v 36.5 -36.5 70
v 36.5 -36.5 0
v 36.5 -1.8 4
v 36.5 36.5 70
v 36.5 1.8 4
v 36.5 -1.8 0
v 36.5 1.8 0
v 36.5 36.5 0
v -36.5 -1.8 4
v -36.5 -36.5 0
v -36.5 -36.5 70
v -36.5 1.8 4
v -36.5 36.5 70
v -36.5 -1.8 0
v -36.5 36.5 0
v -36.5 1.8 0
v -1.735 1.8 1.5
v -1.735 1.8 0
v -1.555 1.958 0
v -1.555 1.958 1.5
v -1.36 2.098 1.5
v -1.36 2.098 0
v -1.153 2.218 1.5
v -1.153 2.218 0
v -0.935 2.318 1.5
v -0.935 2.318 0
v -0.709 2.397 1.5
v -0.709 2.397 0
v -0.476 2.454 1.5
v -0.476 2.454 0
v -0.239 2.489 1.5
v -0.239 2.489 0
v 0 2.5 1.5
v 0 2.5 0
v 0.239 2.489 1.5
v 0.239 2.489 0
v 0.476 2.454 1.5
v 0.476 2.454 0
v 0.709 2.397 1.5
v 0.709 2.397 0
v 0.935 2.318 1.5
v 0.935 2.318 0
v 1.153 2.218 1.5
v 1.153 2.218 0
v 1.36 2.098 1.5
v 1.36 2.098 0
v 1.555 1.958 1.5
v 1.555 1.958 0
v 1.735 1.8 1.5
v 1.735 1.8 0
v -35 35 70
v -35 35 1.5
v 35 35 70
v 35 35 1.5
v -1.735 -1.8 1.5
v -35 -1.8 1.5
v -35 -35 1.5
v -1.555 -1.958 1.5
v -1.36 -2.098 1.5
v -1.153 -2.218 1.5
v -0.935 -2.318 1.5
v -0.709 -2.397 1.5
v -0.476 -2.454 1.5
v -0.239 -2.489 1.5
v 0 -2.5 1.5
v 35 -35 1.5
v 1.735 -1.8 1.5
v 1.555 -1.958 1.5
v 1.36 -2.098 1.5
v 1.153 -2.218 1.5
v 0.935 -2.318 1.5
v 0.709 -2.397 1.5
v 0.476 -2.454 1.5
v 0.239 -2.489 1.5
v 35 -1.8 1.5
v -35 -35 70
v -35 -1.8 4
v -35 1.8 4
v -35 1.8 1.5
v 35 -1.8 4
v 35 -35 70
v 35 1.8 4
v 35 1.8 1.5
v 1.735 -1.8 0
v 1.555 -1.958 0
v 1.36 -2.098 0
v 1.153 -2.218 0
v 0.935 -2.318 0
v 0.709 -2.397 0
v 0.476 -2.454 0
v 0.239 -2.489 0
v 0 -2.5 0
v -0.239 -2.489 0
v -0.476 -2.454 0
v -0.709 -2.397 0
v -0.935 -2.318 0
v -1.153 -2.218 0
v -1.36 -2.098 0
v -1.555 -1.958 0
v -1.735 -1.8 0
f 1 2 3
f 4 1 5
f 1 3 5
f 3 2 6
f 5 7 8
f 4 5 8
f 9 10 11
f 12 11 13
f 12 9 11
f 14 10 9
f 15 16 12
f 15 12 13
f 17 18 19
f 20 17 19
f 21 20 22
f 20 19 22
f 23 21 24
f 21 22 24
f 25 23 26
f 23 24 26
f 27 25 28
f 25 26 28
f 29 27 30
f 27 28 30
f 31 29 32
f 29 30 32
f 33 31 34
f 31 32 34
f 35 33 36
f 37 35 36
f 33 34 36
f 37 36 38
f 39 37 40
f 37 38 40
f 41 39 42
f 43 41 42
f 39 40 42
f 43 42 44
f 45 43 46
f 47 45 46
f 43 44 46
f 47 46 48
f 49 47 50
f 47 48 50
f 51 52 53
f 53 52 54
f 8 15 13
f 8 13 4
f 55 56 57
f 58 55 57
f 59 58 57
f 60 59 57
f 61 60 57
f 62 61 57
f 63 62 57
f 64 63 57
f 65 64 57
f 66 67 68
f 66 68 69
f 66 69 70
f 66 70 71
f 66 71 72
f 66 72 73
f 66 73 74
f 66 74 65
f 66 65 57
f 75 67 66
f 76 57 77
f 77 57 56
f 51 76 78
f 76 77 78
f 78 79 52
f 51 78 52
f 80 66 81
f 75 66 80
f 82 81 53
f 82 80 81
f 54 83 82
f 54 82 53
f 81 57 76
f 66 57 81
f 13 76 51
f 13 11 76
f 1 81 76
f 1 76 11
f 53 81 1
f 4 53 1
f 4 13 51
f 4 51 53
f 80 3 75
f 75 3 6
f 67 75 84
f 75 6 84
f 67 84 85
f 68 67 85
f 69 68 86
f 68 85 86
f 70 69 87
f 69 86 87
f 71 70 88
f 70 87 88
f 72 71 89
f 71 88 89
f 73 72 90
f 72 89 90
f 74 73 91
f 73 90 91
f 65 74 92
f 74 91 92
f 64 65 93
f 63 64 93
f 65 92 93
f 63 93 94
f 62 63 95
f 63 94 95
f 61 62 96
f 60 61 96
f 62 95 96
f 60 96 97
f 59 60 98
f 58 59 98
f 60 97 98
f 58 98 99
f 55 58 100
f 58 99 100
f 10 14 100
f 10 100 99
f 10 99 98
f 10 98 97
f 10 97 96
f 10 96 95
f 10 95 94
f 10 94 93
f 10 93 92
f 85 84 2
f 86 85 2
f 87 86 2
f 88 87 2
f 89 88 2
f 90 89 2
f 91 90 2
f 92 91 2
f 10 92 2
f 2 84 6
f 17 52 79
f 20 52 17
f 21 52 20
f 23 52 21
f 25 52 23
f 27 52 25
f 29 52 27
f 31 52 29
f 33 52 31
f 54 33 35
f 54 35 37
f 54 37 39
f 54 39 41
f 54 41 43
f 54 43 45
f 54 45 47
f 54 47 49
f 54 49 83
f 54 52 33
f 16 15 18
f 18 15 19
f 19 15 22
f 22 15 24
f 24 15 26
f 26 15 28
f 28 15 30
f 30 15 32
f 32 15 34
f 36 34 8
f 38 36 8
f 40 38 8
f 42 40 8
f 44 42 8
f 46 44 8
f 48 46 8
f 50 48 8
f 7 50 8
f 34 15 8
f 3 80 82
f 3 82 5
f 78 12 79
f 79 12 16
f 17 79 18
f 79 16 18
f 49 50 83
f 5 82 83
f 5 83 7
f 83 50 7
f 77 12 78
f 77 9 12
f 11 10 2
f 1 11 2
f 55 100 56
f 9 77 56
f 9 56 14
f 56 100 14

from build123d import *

# Parameters (mm, degrees)
F0_W     = 73
F0_H     = 73
F1_DEPTH = 70
F2_T     = -1.5
F4_DEPTH = 4


with BuildPart() as f1:
    # F0 (on Top) → F1 (new body)
    with BuildSketch(Plane.XY):
        Rectangle(F0_W, F0_H)
    extrude(amount=F1_DEPTH)

    # F2
    f2_openings = [f1.faces().sort_by_distance(p)[0] for p in [
        (0, 0, 70),
    ]]
    offset(amount=F2_T, openings=f2_openings)

    # F3 (on face) → F4 (cut)
    with BuildSketch(Plane(origin=(0, 0, 0), x_dir=(1, 0, 0), z_dir=(0, 0, -1))):
        with BuildLine():
            Line((1.7349351573, -1.8), (36.5, -1.8))
            Line((36.5, -1.8), (36.5, 1.8))
            Line((36.5, 1.8), (1.7349351573, 1.8))
            ThreePointArc((1.7349351573, 1.8), (2.3007974588, 0.9779218033), (2.5, 0))
            ThreePointArc((2.5, 0), (2.3007974588, -0.9779218033), (1.7349351573, -1.8))
        make_face()
        with BuildLine():
            ThreePointArc((-1.7349351573, -1.8), (0, -2.5), (1.7349351573, -1.8))
            Line((1.7349351573, -1.8), (-1.7349351573, -1.8))
        make_face()
        with BuildLine():
            Line((-1.7349351573, -1.8), (1.7349351573, -1.8))
            ThreePointArc((1.7349351573, -1.8), (2.3007974588, -0.9779218033), (2.5, 0))
            ThreePointArc((2.5, 0), (2.3007974588, 0.9779218033), (1.7349351573, 1.8))
            Line((1.7349351573, 1.8), (-1.7349351573, 1.8))
            ThreePointArc((-1.7349351573, 1.8), (-2.5, 0), (-1.7349351573, -1.8))
        make_face()
        with BuildLine():
            Line((-36.5, -1.8), (-1.7349351573, -1.8))
            ThreePointArc((-1.7349351573, -1.8), (-2.5, 0), (-1.7349351573, 1.8))
            Line((-1.7349351573, 1.8), (-36.5, 1.8))
            Line((-36.5, 1.8), (-36.5, -1.8))
        make_face()
        with BuildLine():
            Line((-1.7349351573, 1.8), (1.7349351573, 1.8))
            ThreePointArc((1.7349351573, 1.8), (0, 2.5), (-1.7349351573, 1.8))
        make_face()
    extrude(amount=-F4_DEPTH, mode=Mode.SUBTRACT)


solid = f1.part
